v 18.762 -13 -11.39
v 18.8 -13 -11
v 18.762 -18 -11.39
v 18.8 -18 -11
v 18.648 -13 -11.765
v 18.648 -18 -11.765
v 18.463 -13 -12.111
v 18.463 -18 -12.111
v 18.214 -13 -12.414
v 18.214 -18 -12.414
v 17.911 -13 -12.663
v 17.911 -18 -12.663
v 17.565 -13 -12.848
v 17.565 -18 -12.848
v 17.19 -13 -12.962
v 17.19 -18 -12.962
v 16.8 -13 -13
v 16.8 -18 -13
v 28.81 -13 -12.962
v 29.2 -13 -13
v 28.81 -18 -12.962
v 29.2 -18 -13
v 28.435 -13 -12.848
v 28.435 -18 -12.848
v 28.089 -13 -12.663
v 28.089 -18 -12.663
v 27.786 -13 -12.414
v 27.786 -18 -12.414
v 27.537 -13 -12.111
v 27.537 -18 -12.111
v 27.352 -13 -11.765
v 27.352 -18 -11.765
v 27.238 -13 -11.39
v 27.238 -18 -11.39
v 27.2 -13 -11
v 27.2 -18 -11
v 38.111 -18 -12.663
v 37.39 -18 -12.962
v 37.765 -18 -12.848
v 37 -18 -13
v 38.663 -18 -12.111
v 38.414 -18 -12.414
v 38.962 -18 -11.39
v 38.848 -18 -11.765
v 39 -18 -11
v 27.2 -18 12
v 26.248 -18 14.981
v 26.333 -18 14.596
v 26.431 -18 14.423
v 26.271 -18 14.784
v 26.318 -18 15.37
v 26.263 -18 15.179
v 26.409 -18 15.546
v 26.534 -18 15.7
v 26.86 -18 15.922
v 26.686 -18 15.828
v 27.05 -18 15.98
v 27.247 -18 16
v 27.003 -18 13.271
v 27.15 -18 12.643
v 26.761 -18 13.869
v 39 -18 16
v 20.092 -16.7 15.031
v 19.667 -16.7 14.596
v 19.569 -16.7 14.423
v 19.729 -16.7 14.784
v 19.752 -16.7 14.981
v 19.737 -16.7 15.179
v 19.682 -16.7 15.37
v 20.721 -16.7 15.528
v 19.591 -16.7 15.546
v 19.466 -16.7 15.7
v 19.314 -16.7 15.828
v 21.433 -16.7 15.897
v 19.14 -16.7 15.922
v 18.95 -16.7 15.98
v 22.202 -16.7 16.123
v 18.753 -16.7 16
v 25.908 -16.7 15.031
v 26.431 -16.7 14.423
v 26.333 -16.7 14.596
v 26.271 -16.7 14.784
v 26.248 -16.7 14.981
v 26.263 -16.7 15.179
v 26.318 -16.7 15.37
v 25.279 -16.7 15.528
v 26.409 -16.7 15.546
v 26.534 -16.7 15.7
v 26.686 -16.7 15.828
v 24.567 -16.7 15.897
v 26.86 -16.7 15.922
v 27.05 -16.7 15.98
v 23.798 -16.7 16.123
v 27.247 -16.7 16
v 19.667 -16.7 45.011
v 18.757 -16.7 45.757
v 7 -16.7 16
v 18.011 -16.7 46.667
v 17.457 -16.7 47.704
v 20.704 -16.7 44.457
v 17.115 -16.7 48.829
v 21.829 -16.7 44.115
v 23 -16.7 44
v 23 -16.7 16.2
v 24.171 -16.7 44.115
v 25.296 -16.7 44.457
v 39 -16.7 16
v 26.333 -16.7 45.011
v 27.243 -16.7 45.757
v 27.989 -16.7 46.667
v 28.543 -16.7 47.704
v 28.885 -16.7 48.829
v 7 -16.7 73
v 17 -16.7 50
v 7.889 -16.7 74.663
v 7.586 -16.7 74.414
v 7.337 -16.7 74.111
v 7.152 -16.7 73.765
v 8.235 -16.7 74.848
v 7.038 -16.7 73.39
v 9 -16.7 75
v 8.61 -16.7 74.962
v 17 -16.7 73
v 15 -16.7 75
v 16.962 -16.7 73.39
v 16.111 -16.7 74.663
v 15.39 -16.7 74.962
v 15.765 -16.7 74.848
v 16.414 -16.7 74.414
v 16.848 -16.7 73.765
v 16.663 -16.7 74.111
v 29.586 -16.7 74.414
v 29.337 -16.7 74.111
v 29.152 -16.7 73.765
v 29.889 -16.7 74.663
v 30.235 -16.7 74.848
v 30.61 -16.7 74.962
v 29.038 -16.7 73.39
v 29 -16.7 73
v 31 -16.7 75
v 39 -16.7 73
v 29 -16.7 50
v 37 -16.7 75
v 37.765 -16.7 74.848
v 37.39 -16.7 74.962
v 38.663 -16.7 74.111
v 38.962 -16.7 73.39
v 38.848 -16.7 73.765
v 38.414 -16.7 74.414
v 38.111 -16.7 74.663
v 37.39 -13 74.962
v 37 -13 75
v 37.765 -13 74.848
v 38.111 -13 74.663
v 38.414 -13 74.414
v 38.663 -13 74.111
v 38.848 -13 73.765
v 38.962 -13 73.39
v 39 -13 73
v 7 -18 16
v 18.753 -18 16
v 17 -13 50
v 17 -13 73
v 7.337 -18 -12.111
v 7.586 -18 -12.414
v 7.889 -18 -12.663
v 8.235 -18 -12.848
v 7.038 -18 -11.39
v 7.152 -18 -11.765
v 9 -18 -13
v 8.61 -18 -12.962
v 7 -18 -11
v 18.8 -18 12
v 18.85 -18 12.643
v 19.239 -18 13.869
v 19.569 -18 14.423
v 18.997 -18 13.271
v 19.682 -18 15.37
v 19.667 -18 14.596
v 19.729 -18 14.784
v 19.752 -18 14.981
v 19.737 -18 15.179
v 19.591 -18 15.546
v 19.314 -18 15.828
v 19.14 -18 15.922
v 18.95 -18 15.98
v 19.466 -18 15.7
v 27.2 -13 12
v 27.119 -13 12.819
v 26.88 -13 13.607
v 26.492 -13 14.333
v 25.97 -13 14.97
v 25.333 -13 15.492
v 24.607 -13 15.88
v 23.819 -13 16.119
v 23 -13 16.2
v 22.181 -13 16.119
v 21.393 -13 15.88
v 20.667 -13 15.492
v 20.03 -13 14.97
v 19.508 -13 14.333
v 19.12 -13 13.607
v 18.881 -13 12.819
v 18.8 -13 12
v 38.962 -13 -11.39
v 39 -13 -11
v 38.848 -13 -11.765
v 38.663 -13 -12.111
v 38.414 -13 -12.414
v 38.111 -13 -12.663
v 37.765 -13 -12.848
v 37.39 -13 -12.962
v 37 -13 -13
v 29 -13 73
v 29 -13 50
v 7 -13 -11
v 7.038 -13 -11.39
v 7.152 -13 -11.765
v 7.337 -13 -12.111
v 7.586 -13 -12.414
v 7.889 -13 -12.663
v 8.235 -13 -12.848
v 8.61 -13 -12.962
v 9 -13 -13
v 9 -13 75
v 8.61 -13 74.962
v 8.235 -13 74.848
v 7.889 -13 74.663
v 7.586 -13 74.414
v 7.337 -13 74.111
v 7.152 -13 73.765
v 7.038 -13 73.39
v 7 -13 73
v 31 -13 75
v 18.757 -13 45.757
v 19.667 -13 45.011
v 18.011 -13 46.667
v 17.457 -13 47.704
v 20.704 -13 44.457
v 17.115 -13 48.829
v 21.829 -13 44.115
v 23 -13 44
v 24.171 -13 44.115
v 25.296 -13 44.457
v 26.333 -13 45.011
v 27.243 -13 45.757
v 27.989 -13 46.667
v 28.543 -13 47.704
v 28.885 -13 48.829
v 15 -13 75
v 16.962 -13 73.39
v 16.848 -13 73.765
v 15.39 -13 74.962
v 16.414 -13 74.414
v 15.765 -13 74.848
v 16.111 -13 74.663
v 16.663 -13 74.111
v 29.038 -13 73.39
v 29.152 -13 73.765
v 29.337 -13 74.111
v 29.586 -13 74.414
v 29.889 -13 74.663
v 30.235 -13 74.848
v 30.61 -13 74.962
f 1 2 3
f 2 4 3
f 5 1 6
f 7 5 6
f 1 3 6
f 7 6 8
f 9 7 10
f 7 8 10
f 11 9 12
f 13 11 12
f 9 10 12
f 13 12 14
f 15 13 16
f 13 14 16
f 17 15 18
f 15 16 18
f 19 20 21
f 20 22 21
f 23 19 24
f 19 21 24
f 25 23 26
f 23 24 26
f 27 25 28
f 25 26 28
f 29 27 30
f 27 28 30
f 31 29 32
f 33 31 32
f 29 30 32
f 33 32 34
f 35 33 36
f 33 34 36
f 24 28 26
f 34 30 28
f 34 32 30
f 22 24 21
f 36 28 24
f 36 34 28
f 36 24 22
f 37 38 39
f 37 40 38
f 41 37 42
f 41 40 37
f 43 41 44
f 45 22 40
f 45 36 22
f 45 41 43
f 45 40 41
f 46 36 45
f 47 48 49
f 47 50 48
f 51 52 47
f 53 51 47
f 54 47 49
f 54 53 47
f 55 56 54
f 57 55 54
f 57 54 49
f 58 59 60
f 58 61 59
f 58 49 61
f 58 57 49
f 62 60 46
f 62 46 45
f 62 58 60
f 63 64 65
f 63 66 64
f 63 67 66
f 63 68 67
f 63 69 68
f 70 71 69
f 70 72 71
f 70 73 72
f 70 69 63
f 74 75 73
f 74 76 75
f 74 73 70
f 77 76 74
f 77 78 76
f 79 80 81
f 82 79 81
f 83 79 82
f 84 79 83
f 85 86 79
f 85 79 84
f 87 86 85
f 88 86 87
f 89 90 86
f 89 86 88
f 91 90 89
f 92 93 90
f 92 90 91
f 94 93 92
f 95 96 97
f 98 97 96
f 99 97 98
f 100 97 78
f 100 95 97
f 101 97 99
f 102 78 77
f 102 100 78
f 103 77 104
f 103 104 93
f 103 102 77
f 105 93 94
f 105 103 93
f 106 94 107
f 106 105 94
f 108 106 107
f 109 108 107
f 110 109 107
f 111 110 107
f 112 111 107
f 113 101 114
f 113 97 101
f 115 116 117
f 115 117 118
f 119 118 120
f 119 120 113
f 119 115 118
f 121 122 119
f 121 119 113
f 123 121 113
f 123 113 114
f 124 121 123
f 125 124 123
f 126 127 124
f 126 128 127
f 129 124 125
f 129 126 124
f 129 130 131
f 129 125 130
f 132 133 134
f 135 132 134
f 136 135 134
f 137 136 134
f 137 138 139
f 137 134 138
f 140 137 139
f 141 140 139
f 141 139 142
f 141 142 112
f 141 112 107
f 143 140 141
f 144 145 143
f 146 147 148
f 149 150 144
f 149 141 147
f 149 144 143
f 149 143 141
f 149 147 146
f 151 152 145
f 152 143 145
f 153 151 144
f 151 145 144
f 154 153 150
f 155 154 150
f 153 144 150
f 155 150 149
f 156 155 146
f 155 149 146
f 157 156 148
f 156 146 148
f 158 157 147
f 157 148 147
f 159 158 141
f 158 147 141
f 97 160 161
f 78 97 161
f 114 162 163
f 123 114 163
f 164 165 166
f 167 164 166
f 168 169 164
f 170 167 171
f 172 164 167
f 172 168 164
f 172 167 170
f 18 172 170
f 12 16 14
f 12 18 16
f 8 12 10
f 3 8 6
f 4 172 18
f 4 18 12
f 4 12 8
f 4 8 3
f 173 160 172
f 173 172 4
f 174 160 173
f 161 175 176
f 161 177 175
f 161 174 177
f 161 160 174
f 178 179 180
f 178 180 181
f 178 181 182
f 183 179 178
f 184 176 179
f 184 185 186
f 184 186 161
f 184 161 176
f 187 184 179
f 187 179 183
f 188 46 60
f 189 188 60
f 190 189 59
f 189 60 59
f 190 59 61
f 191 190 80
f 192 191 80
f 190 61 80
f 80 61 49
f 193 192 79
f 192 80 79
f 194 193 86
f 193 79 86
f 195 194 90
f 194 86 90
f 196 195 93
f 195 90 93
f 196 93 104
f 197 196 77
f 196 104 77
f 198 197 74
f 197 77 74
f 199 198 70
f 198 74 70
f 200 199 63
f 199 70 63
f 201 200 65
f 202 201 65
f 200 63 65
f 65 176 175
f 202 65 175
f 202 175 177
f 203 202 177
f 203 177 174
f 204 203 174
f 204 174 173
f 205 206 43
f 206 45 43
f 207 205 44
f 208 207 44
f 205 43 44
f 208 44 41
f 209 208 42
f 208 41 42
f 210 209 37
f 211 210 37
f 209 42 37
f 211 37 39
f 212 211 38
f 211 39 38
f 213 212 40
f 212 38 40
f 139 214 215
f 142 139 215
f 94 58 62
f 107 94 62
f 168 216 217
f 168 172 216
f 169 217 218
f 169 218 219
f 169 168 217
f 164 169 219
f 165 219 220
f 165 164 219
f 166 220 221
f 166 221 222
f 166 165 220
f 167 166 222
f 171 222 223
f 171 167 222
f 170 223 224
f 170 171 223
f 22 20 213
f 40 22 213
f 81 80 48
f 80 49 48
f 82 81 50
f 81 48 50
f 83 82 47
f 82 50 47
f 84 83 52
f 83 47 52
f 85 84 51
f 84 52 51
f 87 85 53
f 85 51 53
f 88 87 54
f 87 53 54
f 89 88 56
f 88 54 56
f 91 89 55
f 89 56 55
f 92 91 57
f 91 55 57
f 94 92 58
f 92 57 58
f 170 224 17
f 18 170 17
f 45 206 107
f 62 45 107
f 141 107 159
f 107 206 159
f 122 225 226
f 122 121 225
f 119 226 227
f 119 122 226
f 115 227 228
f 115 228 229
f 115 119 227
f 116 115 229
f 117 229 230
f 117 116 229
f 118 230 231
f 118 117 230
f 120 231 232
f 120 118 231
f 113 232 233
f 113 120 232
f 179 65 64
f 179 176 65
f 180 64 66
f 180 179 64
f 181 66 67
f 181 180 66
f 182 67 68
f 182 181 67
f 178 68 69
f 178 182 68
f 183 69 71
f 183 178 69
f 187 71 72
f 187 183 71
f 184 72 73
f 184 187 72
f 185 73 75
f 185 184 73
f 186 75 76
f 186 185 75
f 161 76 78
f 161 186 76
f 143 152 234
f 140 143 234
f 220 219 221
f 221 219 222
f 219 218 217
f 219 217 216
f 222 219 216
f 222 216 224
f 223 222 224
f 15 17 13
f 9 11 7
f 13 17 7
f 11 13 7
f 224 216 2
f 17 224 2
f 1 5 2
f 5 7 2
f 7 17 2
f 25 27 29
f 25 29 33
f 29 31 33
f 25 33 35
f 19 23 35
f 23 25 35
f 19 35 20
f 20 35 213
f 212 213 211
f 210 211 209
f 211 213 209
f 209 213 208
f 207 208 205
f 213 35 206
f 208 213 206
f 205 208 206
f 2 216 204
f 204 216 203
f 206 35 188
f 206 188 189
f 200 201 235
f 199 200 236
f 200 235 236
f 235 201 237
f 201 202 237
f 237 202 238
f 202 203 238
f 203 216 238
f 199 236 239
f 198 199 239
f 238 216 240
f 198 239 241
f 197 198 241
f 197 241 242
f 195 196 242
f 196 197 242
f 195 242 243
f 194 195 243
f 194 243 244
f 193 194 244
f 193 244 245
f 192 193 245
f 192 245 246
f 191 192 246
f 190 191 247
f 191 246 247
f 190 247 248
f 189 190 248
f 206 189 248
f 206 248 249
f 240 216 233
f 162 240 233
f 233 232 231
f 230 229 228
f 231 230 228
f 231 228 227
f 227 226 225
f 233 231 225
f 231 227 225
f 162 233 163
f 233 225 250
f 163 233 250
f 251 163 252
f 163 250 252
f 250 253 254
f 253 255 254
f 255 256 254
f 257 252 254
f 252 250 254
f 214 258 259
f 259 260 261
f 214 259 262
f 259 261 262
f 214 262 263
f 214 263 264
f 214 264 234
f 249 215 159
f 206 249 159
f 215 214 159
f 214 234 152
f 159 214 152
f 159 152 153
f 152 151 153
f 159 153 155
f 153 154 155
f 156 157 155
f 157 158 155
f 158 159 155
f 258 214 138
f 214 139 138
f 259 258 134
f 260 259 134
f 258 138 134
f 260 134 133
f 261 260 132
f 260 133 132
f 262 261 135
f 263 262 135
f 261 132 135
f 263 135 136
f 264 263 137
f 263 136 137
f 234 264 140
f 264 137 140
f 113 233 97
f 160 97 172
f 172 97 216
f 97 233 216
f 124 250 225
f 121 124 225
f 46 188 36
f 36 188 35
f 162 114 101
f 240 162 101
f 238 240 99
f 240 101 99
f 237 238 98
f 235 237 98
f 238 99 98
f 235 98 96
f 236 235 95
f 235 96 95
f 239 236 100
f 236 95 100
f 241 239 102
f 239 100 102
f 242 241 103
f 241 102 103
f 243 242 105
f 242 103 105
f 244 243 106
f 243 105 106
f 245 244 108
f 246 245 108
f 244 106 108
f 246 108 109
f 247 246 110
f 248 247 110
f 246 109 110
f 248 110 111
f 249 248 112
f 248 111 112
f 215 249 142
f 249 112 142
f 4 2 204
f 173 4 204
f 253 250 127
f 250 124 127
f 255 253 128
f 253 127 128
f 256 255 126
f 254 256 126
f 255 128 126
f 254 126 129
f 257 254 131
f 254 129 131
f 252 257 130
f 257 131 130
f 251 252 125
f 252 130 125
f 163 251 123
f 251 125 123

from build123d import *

# Parameters (mm, degrees)
F2_DEPTH = 5
F5_DEPTH = 1.3
F7_R     = 6
F7_R_2   = 4.2
F8_DEPTH = 5.001
F9_R     = 2
F10_R    = 1


with BuildPart() as f2:
    # F1 (on offset) → F2 (new body)
    with BuildSketch(Plane.XZ.offset(13)):
        Polygon((17, 75), (7, 75), (7, -13), (18.8, -13), (18.8, 12), (27.2, 12), (27.2, -13), (39, -13), (39, 75), (29, 75), (29, 50), (17, 50), align=None)
    extrude(amount=F2_DEPTH)

    # F4 (on offset) → F5 (cut)
    with BuildSketch(Plane.XZ.offset(18)):
        Polygon((7, 16), (39, 16), (39, 75), (29, 75), (29, 50), (17, 50), (17, 75), (7, 75), align=None)
    extrude(amount=-F5_DEPTH, mode=Mode.SUBTRACT)

    # F7 (on offset) → F8 (cut, through all)
    with BuildSketch(Plane.XZ.offset(18)):
        with Locations((23, 50)):
            Circle(F7_R)
        with Locations((23, 12)):
            Circle(F7_R_2)
    extrude(amount=-F8_DEPTH, mode=Mode.SUBTRACT)

    # F9
    f9_edges = [f2.edges().sort_by_distance(p)[0] for p in [
        (7, -14.85, 75),
        (17, -14.85, 75),
        (29, -14.85, 75),
        (39, -14.85, 75),
        (7, -15.5, -13),
        (18.8, -15.5, -13),
        (27.2, -15.5, -13),
        (39, -15.5, -13),
    ]]
    fillet(f9_edges, radius=F9_R)

    # F10
    f10_edges = [f2.edges().sort_by_distance(p)[0] for p in [
        (21.719375, -17.35, 16),
        (24.280625, -17.35, 16),
    ]]
    fillet(f10_edges, radius=F10_R)


solid = f2.part
